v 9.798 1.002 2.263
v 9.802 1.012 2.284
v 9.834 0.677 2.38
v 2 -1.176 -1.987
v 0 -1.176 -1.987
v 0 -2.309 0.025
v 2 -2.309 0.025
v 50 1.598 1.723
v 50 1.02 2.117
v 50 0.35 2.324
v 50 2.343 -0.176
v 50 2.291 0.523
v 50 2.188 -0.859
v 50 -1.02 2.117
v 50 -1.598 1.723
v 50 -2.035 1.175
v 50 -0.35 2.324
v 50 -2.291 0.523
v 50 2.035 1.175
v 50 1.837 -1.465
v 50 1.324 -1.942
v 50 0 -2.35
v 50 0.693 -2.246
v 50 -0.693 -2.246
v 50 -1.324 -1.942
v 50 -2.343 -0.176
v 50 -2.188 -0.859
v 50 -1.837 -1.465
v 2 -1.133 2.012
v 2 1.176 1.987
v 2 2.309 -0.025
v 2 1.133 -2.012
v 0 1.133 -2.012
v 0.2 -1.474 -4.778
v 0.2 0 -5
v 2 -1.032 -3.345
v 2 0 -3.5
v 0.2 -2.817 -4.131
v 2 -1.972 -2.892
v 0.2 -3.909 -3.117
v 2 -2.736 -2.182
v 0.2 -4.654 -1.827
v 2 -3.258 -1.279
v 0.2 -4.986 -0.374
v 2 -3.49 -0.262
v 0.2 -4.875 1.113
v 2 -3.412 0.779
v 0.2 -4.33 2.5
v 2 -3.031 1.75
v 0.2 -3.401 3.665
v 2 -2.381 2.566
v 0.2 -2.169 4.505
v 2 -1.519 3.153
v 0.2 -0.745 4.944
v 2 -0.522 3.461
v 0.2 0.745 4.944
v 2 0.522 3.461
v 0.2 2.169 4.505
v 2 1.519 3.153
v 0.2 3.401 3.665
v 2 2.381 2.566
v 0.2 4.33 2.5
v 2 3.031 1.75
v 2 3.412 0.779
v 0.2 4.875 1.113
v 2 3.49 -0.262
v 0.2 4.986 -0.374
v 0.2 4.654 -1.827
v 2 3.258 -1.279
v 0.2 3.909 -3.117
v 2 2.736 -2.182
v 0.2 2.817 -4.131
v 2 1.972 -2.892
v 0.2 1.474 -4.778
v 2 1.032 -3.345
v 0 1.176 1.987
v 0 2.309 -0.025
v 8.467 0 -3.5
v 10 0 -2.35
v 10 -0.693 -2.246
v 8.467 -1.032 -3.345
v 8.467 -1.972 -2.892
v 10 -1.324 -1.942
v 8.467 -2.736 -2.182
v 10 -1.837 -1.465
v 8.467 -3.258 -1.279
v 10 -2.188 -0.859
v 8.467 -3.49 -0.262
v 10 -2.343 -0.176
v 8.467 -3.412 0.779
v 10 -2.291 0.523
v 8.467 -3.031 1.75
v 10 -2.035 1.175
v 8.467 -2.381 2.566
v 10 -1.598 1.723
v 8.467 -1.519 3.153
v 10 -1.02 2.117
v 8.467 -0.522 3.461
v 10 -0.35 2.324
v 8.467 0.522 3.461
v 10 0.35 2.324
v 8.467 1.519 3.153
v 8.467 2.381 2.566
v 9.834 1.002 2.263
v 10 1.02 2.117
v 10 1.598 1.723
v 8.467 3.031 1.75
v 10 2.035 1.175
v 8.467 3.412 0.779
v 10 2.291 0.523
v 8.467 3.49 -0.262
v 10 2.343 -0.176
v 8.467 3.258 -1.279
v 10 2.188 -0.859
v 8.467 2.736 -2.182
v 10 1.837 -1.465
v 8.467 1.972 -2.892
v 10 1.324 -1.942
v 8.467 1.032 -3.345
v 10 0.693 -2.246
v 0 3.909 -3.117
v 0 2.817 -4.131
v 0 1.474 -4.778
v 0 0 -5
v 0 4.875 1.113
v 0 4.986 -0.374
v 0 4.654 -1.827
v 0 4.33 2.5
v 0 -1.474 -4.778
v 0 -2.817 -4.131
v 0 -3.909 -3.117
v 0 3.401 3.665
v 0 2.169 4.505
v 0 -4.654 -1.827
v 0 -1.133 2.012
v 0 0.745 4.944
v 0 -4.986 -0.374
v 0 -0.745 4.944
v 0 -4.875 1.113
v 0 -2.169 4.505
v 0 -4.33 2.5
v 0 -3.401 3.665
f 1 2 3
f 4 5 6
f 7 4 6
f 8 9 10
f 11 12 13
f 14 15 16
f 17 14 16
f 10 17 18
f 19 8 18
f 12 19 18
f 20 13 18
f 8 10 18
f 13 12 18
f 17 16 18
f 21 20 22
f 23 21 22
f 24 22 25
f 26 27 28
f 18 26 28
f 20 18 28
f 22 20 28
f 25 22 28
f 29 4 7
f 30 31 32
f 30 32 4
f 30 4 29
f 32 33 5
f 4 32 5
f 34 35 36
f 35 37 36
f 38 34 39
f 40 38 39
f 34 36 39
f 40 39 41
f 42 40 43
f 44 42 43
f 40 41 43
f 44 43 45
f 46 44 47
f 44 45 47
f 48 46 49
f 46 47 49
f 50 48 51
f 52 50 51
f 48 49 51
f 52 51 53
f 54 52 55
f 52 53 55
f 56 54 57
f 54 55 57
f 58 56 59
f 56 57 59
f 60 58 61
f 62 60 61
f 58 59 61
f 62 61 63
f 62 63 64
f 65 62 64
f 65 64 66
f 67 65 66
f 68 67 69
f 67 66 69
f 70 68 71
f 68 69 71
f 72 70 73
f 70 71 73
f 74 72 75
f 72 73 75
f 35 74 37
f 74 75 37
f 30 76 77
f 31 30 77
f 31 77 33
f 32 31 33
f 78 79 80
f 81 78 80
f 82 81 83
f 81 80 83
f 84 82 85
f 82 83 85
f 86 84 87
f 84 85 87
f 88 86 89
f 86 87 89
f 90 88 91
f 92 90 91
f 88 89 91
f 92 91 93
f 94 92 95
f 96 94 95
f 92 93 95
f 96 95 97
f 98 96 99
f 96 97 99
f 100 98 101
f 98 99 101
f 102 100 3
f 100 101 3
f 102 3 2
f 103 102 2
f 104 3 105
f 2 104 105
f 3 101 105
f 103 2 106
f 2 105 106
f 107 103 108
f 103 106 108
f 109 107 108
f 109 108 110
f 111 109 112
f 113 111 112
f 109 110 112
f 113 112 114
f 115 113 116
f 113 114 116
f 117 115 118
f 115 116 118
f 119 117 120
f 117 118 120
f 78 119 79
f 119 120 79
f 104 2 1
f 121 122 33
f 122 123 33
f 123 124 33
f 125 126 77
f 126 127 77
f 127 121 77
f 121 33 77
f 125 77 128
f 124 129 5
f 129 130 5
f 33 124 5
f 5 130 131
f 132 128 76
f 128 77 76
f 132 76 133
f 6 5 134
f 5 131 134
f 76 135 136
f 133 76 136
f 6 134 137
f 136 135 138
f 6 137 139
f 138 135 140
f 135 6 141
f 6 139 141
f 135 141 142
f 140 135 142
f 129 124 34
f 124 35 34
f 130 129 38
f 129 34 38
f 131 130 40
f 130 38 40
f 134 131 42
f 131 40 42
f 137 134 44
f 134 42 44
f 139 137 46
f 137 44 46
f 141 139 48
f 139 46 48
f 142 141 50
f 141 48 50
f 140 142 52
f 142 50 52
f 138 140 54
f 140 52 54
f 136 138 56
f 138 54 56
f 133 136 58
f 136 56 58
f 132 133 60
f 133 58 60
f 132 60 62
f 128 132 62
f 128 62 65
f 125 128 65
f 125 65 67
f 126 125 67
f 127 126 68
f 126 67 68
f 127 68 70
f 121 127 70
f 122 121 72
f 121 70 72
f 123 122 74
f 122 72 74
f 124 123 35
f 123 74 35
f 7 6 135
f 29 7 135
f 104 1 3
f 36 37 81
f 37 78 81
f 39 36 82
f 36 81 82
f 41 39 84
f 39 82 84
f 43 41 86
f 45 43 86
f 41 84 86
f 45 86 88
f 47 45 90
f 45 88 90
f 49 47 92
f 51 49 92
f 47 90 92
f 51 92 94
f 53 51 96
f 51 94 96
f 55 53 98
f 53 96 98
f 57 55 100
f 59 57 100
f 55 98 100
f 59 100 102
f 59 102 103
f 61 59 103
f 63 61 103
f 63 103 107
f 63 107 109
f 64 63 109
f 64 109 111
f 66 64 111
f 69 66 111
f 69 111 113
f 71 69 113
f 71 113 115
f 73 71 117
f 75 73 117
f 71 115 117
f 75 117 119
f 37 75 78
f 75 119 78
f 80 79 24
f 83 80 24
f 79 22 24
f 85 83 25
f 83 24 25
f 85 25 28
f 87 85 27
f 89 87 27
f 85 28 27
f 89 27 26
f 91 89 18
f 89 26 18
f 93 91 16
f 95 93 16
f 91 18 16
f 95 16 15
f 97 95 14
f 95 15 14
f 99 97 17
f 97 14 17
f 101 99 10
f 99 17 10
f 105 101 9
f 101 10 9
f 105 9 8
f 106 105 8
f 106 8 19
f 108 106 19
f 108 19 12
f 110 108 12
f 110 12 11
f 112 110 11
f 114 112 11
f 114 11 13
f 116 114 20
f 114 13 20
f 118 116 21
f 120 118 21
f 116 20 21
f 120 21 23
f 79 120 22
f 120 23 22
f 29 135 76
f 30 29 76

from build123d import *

# Parameters (mm, degrees)
CUT_EXTRUDE1_DEPTH     = 2
CUT_SWEEP6_PITCH       = 1.62
CUT_SWEEP6_HEIGHT      = 40
CUT_SWEEP6_RADIUS      = 3.5
CUT_SWEEP6_START_ANGLE = -45


with BuildPart() as part:
    # Sketch1 → Revolve1 (revolve)
    with BuildSketch(Plane(origin=(0, 0, 0), x_dir=(1, 0, 0), z_dir=(0, 1, 0))):
        Polygon((0, 0), (0, 5), (0.2, 5), (2, 3.5), (8.466666667, 3.5), (10, 2.35), (50, 2.35), (50, 0), align=None)
    revolve(axis=Axis((50, 0, 0), (-1, 0, 0)))

    # Sketch2 → Cut-Extrude1 (cut)
    with BuildSketch(Plane.ZY):
        Polygon((1.987284991, 1.176448765), (-0.025192021, 2.30926367), (-2.012477012, 1.132814905), (-1.987284991, -1.176448765), (0.025192021, -2.30926367), (2.012477012, -1.132814905), align=None)
    extrude(amount=-CUT_EXTRUDE1_DEPTH, mode=Mode.SUBTRACT)

    # Cut-Sweep6: sweep along a helix
    with BuildLine() as cut_sweep6_path:
        add(Helix(CUT_SWEEP6_PITCH, CUT_SWEEP6_HEIGHT, CUT_SWEEP6_RADIUS, center=(50, 0, 0), direction=(-1, 0, 0), mode=Mode.PRIVATE).rotate(Axis((50, 0, 0), (-1, 0, 0)), CUT_SWEEP6_START_ANGLE))
    # Sketch6 → Cut-Sweep6 (sweep, cut)
    with BuildSketch(Plane(origin=(0, 0, 0), x_dir=(1, 0, 0), z_dir=(0, 1, 0))):
        Polygon((50, 2.474873734), (49.595000005, 2.474873734), (49.797500002, 3.500000136), align=None)
    sweep(path=cut_sweep6_path.line, is_frenet=True, mode=Mode.SUBTRACT)


solid = part.part
